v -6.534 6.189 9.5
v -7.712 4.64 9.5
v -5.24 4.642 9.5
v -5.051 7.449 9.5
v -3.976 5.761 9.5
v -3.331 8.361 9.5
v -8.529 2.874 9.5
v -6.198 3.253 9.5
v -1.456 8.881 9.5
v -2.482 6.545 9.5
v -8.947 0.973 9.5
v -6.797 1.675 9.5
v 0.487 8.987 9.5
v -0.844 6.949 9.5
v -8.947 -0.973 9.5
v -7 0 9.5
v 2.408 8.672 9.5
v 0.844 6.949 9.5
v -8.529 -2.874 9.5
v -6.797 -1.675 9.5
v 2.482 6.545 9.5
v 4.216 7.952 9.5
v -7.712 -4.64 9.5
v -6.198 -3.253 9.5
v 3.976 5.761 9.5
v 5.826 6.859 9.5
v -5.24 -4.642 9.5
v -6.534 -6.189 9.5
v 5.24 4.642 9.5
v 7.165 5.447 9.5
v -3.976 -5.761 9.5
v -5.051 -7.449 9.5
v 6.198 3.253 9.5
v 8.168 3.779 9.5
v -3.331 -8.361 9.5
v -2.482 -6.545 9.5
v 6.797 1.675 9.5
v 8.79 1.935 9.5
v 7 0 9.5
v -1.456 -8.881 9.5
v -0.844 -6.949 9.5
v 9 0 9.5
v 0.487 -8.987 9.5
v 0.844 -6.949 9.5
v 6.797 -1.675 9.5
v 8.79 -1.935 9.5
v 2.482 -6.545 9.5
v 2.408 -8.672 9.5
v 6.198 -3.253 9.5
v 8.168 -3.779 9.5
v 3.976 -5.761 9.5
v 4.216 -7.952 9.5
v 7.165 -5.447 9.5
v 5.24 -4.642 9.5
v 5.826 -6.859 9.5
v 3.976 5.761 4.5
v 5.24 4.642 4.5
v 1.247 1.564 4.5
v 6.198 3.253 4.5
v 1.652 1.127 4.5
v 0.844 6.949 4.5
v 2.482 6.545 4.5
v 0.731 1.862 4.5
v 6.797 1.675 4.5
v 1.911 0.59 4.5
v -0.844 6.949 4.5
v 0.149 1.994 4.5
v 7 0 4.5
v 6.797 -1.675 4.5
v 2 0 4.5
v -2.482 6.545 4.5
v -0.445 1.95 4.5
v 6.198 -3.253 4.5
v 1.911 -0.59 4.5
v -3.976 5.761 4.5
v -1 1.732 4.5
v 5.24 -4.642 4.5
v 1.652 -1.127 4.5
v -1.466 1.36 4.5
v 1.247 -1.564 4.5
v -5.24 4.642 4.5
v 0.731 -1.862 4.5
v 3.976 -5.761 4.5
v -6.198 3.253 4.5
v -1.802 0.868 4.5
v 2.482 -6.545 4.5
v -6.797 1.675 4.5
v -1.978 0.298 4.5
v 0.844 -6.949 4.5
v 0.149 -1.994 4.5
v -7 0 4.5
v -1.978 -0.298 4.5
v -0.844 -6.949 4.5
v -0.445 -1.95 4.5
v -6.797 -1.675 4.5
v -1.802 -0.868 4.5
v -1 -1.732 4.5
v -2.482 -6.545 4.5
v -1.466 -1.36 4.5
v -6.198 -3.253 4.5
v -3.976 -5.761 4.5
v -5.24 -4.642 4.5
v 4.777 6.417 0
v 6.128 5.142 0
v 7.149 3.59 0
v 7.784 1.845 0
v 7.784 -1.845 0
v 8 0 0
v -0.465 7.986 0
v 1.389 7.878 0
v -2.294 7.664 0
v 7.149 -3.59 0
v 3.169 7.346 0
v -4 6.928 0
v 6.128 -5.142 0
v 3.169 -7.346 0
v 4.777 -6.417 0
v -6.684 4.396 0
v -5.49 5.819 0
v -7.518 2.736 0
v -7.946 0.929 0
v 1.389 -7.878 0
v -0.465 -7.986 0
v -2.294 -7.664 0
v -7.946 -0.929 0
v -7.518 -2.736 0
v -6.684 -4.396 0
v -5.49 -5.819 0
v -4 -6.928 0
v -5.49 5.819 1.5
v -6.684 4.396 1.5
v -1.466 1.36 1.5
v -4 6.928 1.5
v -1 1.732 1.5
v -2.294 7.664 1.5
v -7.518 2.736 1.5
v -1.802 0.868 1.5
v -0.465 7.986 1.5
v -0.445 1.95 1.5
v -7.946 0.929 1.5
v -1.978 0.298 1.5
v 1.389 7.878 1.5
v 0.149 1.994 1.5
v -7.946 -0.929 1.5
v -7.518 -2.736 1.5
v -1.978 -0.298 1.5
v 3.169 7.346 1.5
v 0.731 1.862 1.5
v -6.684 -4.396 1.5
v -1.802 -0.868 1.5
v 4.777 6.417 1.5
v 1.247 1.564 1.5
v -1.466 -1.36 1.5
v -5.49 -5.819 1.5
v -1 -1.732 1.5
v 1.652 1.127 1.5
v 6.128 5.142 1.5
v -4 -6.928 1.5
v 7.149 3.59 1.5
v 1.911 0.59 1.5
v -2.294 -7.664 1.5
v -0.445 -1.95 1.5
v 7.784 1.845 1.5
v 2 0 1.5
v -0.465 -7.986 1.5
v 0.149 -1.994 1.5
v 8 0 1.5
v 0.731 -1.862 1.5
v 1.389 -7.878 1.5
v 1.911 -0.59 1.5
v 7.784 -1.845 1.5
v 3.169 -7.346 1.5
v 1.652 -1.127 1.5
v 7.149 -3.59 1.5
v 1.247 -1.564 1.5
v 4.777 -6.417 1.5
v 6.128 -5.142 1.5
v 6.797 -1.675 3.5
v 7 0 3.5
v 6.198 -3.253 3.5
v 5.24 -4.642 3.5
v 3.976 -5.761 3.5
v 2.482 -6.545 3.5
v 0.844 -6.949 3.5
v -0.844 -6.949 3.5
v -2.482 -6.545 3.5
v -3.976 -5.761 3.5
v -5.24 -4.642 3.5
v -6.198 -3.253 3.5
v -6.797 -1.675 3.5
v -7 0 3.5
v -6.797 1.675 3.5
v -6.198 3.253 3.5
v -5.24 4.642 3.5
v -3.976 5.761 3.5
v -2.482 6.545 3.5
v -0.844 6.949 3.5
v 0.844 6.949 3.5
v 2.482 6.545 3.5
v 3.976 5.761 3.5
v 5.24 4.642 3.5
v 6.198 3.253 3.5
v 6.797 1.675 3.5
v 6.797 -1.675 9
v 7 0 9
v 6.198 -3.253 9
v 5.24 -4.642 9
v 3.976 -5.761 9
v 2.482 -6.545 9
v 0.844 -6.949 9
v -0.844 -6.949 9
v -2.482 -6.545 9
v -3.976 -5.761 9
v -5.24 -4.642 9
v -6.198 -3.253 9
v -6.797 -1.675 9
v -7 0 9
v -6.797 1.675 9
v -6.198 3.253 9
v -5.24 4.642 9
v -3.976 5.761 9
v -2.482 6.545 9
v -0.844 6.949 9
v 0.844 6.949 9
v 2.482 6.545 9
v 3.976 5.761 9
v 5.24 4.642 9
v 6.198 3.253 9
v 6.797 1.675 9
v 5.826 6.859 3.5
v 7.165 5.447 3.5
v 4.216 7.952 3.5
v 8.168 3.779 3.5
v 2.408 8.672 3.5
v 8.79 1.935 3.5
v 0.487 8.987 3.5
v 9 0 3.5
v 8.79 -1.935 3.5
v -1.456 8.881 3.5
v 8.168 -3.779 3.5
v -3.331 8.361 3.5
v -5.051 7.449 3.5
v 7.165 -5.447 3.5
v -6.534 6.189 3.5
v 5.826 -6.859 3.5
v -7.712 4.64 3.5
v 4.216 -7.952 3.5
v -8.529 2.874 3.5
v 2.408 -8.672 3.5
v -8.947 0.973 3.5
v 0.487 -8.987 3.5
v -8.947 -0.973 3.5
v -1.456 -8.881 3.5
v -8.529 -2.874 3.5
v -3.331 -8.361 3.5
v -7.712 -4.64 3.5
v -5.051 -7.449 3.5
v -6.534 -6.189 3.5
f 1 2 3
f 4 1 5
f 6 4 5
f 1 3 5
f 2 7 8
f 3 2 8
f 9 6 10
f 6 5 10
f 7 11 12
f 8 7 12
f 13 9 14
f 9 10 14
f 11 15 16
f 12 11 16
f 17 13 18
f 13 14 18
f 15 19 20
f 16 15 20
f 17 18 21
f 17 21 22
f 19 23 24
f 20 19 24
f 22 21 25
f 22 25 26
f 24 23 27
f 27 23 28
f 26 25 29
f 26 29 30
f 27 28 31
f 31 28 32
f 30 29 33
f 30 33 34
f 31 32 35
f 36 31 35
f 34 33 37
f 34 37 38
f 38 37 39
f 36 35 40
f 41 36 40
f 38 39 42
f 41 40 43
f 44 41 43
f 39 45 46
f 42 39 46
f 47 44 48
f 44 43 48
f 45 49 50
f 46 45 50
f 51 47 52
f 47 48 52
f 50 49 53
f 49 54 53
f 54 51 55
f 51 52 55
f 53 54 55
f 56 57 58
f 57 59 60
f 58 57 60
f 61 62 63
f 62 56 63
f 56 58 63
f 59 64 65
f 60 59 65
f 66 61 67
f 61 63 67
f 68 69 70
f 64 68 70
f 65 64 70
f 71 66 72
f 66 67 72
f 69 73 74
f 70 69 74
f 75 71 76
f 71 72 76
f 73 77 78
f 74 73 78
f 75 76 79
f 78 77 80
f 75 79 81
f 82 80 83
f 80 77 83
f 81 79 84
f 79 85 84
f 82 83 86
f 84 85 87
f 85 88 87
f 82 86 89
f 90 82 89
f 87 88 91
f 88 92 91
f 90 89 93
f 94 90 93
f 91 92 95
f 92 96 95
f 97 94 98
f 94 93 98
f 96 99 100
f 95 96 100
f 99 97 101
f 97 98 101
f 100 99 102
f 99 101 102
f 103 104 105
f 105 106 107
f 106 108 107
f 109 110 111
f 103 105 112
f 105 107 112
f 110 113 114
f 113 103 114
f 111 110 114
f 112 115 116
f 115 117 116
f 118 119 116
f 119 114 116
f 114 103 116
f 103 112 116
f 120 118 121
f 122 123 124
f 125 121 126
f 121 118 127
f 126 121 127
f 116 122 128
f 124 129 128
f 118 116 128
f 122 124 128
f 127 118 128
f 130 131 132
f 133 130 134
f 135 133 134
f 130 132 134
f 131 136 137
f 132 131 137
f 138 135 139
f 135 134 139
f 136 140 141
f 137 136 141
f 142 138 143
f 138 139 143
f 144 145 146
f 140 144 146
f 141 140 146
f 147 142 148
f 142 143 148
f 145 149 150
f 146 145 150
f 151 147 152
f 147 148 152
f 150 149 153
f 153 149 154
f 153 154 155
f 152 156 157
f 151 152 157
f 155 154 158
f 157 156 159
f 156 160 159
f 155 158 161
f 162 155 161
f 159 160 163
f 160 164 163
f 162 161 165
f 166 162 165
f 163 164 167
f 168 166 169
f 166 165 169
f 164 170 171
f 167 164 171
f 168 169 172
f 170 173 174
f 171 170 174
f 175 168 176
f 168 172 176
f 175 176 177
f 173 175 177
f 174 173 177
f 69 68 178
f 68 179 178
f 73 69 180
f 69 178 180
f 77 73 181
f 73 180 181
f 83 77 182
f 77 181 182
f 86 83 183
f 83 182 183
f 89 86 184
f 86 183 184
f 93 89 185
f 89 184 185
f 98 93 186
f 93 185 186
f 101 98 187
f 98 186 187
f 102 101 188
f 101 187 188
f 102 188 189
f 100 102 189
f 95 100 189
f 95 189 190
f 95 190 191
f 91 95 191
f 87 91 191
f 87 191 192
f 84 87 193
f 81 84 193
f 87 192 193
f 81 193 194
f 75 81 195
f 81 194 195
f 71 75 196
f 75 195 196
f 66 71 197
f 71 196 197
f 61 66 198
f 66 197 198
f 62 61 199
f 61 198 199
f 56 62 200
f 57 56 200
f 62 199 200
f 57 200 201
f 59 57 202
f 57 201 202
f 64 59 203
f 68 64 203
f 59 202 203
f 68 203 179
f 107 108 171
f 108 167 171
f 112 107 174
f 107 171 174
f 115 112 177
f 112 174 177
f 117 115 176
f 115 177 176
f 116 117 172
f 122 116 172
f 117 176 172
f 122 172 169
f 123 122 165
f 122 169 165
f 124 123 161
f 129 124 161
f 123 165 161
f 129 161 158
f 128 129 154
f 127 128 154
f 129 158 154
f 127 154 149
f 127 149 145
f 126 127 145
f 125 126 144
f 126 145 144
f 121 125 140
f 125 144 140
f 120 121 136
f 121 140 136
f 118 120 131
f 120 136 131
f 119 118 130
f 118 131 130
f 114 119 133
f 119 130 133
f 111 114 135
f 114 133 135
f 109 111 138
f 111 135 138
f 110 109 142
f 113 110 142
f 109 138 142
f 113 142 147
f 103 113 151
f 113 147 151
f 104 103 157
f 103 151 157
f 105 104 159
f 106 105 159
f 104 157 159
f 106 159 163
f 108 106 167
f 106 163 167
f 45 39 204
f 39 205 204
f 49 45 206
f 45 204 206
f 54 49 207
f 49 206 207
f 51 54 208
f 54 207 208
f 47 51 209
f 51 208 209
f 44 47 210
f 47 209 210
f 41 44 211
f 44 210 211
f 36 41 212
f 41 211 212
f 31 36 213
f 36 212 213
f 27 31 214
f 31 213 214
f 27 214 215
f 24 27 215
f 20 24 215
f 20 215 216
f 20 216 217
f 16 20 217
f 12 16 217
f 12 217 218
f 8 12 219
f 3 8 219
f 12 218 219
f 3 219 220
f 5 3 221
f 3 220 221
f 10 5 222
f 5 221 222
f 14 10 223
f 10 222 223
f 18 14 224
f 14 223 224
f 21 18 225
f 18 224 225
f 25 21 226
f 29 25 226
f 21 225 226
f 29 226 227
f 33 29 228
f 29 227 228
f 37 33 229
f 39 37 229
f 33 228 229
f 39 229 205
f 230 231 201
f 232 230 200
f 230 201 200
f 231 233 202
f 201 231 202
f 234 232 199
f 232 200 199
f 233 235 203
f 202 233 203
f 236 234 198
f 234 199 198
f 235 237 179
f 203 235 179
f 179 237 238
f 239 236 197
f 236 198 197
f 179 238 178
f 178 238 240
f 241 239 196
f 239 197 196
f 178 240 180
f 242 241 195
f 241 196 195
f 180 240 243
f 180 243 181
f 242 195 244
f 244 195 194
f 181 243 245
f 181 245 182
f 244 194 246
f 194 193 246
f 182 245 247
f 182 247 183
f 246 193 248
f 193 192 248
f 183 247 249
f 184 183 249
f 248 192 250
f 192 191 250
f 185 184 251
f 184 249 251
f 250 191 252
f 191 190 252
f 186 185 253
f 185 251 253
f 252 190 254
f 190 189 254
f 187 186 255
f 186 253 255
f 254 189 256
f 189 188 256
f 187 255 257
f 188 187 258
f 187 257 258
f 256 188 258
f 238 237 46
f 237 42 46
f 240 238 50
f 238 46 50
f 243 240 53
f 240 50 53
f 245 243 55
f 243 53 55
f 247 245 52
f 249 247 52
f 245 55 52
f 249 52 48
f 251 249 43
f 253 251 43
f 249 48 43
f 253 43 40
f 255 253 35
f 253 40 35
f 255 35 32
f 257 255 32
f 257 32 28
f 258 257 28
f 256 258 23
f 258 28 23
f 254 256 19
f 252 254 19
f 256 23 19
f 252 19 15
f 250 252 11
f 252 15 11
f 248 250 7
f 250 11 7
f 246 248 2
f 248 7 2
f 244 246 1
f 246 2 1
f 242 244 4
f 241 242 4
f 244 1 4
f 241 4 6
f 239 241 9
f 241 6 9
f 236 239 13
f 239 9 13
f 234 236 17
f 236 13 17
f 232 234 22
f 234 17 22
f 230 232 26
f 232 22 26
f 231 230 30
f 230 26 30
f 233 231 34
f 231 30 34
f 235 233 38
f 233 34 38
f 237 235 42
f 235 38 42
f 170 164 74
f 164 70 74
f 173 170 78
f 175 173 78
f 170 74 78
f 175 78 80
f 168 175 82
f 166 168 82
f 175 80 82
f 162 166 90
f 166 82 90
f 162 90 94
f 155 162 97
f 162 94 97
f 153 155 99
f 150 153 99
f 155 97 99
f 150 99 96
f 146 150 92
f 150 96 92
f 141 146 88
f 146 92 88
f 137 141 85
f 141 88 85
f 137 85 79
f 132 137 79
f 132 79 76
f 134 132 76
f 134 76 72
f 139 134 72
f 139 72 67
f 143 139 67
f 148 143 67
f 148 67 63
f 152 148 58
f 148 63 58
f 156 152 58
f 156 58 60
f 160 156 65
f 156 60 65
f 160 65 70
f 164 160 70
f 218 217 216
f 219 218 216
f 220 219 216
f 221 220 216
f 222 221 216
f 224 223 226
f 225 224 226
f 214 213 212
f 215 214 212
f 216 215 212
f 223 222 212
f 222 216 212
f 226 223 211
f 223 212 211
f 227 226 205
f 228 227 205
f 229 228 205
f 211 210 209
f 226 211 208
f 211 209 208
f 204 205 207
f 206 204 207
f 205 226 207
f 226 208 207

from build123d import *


with BuildPart() as f1:
    # F0 (on Front) → F1 (revolve)
    with BuildSketch(Plane.XZ):
        Polygon((0, 1.5), (0, 0), (8, 0), (8, 1.5), (2, 1.5), align=None)
        Polygon((0, 9), (0, 1.5), (2, 1.5), (2, 4.5), (7, 4.5), (7, 3.5), (9, 3.5), (9, 9.5), (7, 9.5), (7, 9), align=None)
    revolve(axis=Axis((0, 0, 4.5), (0, 0, -1)))


solid = f1.part
